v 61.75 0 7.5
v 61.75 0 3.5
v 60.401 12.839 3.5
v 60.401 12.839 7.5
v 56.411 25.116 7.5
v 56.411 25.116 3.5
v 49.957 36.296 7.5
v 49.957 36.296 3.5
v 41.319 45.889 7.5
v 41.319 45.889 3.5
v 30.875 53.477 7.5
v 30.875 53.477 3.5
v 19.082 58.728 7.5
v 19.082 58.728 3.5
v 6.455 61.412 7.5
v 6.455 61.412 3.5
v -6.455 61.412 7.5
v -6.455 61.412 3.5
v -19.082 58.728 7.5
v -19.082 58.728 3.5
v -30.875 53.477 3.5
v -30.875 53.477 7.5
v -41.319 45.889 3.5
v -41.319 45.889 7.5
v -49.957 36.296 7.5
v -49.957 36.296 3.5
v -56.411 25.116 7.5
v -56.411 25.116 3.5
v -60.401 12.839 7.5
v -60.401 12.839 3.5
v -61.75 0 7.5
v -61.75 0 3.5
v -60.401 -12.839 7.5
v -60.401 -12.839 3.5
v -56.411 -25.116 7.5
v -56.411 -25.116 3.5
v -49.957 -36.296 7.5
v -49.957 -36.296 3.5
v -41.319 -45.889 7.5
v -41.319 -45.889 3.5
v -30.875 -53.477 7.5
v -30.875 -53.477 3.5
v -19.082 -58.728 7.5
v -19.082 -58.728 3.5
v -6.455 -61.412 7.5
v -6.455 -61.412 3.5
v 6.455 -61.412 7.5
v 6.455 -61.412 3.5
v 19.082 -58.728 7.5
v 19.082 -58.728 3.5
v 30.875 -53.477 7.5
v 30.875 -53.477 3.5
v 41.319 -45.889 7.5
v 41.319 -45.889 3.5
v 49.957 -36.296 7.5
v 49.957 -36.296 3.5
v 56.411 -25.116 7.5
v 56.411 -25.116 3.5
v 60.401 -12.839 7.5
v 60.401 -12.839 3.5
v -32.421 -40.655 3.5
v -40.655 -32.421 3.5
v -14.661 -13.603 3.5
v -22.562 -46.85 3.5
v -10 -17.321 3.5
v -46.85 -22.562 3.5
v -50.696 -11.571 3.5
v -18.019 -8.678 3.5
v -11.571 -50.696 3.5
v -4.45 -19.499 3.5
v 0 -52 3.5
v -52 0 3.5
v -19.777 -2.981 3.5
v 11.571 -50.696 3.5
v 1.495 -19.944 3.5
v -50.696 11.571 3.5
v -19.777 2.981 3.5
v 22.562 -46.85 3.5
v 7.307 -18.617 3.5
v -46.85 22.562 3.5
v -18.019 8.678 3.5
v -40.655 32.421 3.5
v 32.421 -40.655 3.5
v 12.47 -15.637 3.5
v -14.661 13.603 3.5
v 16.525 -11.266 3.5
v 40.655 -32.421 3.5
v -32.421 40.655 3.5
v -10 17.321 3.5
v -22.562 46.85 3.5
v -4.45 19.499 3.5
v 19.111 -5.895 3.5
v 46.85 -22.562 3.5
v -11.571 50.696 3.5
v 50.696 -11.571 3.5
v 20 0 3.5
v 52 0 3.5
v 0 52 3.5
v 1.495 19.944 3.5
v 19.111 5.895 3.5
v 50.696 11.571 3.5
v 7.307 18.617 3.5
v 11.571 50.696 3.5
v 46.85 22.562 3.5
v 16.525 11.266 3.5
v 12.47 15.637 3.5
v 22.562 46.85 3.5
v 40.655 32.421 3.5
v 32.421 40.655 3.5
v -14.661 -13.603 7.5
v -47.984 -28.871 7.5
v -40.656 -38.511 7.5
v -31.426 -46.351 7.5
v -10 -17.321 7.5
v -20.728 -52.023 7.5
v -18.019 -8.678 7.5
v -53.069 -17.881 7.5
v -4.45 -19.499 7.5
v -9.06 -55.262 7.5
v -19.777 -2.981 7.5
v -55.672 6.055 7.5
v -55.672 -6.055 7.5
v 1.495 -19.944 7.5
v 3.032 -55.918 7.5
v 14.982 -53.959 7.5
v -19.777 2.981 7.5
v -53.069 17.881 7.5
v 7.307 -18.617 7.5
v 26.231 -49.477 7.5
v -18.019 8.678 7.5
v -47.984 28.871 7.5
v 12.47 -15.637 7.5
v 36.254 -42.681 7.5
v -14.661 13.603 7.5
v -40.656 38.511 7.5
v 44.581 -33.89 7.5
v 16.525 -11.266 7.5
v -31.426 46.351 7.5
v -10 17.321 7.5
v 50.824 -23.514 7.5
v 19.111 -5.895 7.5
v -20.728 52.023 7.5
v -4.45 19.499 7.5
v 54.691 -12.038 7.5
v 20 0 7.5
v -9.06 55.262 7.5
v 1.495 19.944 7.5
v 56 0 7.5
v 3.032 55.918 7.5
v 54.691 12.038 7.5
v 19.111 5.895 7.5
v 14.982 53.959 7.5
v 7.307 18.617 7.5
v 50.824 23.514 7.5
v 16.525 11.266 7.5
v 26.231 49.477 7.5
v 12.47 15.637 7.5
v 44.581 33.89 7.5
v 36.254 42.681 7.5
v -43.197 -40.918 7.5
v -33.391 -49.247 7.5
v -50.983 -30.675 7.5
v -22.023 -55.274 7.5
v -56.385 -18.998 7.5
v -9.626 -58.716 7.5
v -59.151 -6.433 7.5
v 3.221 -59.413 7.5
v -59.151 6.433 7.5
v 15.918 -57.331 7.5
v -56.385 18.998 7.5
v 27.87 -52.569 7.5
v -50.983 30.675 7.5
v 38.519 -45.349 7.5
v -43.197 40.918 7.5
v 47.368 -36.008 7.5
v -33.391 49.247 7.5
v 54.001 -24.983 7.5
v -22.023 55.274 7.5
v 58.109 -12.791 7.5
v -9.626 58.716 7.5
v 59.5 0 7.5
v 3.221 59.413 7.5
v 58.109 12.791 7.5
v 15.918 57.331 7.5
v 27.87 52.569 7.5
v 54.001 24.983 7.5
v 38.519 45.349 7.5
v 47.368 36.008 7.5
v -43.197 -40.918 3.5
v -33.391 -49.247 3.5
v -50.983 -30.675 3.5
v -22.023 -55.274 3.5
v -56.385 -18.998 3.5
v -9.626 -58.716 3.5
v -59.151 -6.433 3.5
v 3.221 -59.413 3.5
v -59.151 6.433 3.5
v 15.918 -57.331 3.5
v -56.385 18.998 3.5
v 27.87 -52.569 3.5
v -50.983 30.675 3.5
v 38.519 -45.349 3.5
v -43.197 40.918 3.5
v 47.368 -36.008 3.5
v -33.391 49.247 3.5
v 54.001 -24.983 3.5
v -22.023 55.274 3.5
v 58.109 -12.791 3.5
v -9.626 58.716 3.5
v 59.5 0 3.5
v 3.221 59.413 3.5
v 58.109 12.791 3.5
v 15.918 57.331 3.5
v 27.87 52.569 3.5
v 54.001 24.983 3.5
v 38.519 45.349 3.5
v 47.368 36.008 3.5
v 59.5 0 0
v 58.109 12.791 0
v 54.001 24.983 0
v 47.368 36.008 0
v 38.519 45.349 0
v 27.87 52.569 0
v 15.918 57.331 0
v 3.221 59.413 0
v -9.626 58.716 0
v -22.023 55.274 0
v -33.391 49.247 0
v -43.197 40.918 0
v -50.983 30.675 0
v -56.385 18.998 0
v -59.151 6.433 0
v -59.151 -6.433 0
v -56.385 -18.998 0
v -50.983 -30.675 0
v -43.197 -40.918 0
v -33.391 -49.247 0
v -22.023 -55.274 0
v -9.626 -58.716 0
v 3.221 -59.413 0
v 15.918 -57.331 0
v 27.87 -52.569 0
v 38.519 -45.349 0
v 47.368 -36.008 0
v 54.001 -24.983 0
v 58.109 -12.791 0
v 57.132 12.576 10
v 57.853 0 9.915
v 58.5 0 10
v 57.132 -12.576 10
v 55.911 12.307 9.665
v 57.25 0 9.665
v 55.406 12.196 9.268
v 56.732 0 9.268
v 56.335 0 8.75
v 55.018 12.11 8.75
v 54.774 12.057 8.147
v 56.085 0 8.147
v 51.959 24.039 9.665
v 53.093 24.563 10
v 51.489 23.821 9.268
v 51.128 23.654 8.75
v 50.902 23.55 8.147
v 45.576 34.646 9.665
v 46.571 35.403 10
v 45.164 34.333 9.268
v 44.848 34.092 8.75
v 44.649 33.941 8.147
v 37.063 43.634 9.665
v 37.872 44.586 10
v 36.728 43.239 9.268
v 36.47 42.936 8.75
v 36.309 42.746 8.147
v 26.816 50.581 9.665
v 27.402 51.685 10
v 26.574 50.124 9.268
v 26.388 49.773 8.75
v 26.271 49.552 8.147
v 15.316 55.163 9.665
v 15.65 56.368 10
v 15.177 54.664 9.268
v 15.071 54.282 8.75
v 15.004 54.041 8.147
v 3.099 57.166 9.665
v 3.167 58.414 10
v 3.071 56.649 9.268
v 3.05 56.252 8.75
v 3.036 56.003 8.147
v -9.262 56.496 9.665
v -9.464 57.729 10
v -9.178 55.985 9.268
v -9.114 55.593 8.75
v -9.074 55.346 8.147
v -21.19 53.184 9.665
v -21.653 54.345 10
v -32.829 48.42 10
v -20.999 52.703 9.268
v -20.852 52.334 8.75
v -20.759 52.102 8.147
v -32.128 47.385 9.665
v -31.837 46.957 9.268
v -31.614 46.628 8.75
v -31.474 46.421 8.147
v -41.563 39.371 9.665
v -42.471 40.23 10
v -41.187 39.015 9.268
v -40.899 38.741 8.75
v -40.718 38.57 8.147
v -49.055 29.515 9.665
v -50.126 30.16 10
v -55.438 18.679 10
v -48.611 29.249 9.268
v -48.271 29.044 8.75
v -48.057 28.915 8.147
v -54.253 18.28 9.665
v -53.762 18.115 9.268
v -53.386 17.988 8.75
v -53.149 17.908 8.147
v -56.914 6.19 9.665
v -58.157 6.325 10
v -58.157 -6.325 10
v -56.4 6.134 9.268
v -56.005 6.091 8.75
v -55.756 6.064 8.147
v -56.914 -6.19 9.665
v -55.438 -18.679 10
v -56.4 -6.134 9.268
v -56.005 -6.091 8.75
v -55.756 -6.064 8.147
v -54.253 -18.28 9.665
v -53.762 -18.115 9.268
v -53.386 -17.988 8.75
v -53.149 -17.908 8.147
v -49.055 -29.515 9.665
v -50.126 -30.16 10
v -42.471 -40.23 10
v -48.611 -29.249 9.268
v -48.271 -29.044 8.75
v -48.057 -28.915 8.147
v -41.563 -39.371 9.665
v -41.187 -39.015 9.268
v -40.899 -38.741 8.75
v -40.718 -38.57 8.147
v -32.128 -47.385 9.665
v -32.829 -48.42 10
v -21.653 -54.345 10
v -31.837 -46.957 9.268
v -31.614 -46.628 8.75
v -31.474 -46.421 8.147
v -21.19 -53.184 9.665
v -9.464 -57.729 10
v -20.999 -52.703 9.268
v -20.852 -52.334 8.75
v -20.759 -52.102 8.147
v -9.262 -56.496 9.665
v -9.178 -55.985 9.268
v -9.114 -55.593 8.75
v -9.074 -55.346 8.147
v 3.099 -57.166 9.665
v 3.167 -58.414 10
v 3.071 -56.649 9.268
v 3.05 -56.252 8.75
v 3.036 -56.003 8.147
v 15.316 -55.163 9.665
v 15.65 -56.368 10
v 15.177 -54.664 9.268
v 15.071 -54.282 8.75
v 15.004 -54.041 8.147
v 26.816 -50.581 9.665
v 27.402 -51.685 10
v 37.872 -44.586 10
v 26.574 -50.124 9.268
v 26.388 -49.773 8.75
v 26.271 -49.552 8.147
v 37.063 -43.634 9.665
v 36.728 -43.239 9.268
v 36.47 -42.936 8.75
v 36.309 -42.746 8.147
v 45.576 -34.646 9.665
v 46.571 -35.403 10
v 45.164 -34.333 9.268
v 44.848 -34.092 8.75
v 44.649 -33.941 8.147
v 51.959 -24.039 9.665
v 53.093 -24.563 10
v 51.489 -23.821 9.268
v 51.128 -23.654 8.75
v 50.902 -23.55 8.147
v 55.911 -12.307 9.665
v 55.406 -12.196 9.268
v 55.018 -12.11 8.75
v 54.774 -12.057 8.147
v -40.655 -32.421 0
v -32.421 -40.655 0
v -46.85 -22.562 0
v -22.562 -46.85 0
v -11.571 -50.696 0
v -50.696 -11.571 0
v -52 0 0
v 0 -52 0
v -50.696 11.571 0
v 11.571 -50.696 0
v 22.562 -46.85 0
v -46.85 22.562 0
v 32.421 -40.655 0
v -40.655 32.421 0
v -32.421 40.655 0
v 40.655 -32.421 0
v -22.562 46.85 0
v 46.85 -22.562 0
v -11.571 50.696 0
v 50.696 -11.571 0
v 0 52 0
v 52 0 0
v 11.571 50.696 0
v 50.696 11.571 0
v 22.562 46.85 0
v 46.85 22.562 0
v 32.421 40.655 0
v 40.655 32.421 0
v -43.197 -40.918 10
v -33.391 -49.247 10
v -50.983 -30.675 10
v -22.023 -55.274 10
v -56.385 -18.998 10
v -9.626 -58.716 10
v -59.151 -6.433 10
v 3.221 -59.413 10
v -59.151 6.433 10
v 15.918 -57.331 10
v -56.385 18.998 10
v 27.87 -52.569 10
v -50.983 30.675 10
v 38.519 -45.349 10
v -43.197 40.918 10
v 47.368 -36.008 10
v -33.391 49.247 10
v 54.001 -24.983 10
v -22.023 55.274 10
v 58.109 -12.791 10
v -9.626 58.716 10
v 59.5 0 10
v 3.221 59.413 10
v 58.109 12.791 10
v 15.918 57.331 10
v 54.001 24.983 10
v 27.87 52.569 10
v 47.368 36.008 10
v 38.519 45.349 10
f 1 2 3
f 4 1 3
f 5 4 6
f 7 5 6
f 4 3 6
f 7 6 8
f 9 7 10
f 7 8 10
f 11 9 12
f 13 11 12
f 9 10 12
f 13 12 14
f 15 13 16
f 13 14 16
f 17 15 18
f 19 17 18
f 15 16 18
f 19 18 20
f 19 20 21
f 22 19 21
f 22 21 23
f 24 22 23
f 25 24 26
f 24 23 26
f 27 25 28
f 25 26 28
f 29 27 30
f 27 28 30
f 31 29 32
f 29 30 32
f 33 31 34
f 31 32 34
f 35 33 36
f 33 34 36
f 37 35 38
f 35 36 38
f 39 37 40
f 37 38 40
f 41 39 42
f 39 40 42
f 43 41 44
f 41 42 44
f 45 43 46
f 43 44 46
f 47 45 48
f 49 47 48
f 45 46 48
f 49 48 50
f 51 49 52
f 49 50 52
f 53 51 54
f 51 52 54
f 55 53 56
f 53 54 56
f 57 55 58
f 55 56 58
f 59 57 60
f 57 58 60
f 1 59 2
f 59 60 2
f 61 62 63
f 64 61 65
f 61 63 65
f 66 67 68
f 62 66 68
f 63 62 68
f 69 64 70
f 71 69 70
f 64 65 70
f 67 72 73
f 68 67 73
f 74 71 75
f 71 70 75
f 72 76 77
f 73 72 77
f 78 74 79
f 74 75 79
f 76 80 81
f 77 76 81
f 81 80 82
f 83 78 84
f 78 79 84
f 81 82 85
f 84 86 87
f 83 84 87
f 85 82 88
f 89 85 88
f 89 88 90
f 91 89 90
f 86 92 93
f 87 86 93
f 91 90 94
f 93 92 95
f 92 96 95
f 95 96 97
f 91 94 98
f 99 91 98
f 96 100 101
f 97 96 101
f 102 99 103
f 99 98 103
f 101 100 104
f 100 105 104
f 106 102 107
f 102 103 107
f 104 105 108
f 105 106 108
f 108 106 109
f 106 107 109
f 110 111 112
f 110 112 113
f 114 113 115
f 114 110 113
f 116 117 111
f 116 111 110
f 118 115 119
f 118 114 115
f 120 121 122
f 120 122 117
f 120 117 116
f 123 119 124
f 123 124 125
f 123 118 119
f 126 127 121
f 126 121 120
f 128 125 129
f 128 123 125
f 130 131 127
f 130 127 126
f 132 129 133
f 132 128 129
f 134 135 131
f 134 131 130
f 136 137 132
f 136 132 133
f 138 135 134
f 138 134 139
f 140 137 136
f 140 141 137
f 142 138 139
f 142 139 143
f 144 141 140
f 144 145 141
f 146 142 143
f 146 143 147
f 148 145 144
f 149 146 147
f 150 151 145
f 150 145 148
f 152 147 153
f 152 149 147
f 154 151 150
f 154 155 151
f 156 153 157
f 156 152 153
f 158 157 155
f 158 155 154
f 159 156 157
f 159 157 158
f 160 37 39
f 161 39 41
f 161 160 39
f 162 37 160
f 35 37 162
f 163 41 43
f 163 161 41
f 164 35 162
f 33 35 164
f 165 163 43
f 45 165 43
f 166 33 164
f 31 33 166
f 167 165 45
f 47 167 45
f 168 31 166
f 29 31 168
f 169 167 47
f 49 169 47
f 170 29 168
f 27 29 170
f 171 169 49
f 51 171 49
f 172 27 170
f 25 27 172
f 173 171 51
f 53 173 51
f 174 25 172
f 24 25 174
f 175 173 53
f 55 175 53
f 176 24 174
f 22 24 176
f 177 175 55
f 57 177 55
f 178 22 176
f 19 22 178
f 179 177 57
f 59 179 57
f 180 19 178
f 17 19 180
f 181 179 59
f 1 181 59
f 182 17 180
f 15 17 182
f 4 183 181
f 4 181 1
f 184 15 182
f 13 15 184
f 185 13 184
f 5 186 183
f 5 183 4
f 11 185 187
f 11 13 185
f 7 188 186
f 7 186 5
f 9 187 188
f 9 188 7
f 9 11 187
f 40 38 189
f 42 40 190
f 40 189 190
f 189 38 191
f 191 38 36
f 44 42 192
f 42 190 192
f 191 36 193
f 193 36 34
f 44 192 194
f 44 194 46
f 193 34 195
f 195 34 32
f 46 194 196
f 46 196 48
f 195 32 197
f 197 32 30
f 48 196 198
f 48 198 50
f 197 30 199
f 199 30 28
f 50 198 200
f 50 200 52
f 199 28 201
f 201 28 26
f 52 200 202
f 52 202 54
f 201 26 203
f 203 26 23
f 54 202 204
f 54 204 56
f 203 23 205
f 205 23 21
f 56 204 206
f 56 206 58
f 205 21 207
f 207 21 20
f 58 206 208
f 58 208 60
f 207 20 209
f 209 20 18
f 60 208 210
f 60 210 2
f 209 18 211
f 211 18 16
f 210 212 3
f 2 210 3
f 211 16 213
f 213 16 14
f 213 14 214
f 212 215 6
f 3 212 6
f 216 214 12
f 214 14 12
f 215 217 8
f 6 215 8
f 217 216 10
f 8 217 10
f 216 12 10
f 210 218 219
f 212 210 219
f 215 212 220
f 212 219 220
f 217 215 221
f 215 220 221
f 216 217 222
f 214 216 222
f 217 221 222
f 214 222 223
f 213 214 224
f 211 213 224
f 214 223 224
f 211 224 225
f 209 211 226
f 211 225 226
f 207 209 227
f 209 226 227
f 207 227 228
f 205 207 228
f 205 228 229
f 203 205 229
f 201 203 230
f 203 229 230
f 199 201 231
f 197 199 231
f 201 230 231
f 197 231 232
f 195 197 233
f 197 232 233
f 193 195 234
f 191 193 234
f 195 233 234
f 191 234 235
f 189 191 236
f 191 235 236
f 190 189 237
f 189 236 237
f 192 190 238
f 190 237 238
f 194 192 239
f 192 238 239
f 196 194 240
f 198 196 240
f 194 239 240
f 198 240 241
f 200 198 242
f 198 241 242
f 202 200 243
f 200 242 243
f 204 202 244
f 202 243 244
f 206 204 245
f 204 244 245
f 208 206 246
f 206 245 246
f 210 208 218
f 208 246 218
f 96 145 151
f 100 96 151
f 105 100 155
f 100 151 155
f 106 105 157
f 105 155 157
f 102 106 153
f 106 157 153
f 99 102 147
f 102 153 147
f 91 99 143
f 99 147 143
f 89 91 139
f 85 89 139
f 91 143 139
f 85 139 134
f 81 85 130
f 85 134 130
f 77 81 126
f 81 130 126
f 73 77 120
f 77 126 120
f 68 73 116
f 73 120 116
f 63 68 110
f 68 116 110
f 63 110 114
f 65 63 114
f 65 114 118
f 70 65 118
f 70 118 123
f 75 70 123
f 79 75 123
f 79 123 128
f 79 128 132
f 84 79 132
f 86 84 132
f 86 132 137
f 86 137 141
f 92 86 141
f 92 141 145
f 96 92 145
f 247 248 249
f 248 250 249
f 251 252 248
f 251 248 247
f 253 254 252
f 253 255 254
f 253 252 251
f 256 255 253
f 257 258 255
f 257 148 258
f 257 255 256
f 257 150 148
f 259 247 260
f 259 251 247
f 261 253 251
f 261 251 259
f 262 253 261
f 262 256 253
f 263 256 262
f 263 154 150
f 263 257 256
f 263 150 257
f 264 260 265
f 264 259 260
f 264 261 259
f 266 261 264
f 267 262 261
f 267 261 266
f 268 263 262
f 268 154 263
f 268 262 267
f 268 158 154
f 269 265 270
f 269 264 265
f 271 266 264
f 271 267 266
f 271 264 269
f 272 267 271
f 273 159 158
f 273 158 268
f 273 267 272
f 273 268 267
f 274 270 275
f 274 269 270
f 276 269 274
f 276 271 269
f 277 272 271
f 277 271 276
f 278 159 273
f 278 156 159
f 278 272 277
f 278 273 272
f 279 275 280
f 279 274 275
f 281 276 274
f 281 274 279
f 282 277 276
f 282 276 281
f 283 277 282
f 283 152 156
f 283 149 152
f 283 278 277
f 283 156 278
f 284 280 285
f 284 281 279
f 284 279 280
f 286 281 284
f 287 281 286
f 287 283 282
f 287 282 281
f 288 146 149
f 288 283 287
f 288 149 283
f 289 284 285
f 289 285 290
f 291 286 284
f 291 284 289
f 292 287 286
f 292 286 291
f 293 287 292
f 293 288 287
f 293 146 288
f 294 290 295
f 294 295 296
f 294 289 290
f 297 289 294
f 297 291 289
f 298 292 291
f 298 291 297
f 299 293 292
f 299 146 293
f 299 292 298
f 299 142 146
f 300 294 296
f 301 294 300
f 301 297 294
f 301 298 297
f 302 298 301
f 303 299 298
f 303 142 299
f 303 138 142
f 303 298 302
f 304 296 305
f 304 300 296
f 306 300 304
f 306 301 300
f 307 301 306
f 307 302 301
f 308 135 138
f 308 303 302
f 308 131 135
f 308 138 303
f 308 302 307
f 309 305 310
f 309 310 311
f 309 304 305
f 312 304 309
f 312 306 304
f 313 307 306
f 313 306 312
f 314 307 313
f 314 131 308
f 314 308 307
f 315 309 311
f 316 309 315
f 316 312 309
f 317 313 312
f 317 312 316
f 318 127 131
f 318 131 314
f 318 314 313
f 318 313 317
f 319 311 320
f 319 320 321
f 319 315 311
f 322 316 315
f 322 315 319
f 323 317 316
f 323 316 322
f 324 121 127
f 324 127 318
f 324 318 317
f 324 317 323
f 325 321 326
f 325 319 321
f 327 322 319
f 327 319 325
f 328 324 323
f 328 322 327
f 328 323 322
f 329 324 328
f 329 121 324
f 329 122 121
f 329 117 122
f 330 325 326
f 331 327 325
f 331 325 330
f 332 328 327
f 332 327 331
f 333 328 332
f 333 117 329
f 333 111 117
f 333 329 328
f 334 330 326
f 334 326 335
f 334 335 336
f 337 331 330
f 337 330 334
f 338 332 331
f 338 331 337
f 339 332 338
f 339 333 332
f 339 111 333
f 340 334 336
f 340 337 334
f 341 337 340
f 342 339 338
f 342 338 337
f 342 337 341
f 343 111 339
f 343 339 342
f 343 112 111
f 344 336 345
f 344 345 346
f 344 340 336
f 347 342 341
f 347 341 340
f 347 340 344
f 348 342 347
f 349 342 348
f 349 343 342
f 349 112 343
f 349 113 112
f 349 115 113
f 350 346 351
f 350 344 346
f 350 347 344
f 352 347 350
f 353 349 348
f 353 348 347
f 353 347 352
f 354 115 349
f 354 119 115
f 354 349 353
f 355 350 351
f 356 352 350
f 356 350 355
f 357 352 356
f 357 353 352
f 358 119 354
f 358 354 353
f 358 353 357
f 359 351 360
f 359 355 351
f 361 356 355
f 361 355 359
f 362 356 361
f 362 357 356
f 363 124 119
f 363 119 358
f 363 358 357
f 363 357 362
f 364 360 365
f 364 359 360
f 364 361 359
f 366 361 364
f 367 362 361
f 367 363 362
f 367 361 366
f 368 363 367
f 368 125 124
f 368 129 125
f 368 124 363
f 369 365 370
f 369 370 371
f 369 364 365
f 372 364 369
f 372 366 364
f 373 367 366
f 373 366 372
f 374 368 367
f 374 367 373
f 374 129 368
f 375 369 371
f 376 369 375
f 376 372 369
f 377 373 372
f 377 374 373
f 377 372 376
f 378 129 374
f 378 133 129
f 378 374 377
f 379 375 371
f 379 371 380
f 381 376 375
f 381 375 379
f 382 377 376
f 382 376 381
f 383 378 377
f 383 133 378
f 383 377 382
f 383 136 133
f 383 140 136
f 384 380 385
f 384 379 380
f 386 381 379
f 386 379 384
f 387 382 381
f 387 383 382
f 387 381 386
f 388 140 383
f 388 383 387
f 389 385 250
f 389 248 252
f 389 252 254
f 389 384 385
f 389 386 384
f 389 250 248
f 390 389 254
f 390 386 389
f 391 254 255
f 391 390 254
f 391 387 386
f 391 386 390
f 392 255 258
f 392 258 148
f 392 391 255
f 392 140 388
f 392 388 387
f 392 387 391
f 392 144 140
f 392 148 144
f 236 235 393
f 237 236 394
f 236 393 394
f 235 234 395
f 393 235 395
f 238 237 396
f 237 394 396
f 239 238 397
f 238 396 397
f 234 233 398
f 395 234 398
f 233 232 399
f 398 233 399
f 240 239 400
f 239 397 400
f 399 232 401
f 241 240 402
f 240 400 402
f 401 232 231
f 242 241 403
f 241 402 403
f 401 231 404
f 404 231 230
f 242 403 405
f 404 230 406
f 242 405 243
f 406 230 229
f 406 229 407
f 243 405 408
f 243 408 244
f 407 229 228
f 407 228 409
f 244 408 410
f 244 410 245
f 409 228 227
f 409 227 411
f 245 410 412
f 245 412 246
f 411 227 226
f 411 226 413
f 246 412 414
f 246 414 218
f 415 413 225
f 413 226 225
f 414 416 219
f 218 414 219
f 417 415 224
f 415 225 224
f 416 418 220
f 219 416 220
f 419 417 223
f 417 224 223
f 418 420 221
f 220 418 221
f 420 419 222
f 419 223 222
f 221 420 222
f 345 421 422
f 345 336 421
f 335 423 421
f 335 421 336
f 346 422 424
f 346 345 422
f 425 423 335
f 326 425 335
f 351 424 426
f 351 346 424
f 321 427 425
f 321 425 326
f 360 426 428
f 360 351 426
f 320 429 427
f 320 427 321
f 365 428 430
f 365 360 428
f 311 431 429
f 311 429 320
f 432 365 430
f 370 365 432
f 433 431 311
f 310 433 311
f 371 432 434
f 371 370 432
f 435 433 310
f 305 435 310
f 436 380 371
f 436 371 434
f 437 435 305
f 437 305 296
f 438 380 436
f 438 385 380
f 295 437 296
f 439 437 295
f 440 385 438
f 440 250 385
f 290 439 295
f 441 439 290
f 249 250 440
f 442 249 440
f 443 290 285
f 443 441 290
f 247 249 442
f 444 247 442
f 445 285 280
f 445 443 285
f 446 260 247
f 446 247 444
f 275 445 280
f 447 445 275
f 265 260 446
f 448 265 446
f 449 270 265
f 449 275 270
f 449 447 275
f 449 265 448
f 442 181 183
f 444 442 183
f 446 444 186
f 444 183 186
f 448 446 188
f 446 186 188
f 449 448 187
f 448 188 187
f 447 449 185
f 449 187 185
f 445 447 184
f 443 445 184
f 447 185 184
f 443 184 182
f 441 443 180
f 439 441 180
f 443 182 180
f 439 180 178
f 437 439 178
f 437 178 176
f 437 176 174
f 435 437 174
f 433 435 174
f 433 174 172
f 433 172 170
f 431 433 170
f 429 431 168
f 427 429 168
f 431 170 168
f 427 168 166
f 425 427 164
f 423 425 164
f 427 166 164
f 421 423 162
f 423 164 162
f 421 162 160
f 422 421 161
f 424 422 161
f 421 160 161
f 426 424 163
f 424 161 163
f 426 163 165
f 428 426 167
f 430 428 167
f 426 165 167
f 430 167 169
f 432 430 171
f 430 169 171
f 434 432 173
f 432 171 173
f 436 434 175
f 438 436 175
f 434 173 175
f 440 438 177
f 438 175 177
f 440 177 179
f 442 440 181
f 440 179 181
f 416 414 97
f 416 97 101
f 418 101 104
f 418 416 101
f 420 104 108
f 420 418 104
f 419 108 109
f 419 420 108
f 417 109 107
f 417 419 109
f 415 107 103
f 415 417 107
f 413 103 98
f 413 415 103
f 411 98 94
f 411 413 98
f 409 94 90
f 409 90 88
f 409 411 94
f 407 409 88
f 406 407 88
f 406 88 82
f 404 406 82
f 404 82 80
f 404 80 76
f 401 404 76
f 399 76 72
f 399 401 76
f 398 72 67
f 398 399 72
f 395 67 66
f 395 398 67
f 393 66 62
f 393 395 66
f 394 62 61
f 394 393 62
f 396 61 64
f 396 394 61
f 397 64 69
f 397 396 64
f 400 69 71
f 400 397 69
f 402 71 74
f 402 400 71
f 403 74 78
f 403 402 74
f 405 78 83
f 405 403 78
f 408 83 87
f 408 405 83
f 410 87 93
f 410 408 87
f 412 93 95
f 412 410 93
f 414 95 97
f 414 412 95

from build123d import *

# Parameters (mm, degrees)
SKETCH1_R           = 59.5
SKETCH1_R_2         = 52
BOSS_EXTRUDE1_DEPTH = 3.5
SKETCH2_R           = 61.75
BOSS_EXTRUDE2_DEPTH = 4
SKETCH3_R           = 59.5
SKETCH3_R_2         = 56
BOSS_EXTRUDE3_DEPTH = 2.5
FILLET1_R           = 2.5
SKETCH4_R           = 20
CUT_EXTRUDE1_DEPTH  = 22.5


with BuildPart() as part:
    # Sketch1 → Boss-Extrude1 (new body)
    with BuildSketch(Plane.XY):
        Circle(SKETCH1_R)
        Circle(SKETCH1_R_2, mode=Mode.SUBTRACT)
    extrude(amount=BOSS_EXTRUDE1_DEPTH)

    # Sketch2 → Boss-Extrude2 (add)
    with BuildSketch(Plane.XY.offset(3.5)):
        Circle(SKETCH2_R)
    extrude(amount=BOSS_EXTRUDE2_DEPTH)

    # Sketch3 → Boss-Extrude3 (add)
    with BuildSketch(Plane.XY.offset(7.5)):
        Circle(SKETCH3_R)
        Circle(SKETCH3_R_2, mode=Mode.SUBTRACT)
    extrude(amount=BOSS_EXTRUDE3_DEPTH)

    # Fillet1
    fillet1_edges = [part.edges().sort_by_distance(p)[0] for p in [
        (-56, 0, 10),
    ]]
    fillet(fillet1_edges, radius=FILLET1_R - 0.0001)  # a hair under: the kernel refuses the full size

    # Sketch4 → Cut-Extrude1 (cut)
    with BuildSketch(Plane.XY.offset(7.5)):
        Circle(SKETCH4_R)
    extrude(amount=-CUT_EXTRUDE1_DEPTH, mode=Mode.SUBTRACT)


solid = part.part
